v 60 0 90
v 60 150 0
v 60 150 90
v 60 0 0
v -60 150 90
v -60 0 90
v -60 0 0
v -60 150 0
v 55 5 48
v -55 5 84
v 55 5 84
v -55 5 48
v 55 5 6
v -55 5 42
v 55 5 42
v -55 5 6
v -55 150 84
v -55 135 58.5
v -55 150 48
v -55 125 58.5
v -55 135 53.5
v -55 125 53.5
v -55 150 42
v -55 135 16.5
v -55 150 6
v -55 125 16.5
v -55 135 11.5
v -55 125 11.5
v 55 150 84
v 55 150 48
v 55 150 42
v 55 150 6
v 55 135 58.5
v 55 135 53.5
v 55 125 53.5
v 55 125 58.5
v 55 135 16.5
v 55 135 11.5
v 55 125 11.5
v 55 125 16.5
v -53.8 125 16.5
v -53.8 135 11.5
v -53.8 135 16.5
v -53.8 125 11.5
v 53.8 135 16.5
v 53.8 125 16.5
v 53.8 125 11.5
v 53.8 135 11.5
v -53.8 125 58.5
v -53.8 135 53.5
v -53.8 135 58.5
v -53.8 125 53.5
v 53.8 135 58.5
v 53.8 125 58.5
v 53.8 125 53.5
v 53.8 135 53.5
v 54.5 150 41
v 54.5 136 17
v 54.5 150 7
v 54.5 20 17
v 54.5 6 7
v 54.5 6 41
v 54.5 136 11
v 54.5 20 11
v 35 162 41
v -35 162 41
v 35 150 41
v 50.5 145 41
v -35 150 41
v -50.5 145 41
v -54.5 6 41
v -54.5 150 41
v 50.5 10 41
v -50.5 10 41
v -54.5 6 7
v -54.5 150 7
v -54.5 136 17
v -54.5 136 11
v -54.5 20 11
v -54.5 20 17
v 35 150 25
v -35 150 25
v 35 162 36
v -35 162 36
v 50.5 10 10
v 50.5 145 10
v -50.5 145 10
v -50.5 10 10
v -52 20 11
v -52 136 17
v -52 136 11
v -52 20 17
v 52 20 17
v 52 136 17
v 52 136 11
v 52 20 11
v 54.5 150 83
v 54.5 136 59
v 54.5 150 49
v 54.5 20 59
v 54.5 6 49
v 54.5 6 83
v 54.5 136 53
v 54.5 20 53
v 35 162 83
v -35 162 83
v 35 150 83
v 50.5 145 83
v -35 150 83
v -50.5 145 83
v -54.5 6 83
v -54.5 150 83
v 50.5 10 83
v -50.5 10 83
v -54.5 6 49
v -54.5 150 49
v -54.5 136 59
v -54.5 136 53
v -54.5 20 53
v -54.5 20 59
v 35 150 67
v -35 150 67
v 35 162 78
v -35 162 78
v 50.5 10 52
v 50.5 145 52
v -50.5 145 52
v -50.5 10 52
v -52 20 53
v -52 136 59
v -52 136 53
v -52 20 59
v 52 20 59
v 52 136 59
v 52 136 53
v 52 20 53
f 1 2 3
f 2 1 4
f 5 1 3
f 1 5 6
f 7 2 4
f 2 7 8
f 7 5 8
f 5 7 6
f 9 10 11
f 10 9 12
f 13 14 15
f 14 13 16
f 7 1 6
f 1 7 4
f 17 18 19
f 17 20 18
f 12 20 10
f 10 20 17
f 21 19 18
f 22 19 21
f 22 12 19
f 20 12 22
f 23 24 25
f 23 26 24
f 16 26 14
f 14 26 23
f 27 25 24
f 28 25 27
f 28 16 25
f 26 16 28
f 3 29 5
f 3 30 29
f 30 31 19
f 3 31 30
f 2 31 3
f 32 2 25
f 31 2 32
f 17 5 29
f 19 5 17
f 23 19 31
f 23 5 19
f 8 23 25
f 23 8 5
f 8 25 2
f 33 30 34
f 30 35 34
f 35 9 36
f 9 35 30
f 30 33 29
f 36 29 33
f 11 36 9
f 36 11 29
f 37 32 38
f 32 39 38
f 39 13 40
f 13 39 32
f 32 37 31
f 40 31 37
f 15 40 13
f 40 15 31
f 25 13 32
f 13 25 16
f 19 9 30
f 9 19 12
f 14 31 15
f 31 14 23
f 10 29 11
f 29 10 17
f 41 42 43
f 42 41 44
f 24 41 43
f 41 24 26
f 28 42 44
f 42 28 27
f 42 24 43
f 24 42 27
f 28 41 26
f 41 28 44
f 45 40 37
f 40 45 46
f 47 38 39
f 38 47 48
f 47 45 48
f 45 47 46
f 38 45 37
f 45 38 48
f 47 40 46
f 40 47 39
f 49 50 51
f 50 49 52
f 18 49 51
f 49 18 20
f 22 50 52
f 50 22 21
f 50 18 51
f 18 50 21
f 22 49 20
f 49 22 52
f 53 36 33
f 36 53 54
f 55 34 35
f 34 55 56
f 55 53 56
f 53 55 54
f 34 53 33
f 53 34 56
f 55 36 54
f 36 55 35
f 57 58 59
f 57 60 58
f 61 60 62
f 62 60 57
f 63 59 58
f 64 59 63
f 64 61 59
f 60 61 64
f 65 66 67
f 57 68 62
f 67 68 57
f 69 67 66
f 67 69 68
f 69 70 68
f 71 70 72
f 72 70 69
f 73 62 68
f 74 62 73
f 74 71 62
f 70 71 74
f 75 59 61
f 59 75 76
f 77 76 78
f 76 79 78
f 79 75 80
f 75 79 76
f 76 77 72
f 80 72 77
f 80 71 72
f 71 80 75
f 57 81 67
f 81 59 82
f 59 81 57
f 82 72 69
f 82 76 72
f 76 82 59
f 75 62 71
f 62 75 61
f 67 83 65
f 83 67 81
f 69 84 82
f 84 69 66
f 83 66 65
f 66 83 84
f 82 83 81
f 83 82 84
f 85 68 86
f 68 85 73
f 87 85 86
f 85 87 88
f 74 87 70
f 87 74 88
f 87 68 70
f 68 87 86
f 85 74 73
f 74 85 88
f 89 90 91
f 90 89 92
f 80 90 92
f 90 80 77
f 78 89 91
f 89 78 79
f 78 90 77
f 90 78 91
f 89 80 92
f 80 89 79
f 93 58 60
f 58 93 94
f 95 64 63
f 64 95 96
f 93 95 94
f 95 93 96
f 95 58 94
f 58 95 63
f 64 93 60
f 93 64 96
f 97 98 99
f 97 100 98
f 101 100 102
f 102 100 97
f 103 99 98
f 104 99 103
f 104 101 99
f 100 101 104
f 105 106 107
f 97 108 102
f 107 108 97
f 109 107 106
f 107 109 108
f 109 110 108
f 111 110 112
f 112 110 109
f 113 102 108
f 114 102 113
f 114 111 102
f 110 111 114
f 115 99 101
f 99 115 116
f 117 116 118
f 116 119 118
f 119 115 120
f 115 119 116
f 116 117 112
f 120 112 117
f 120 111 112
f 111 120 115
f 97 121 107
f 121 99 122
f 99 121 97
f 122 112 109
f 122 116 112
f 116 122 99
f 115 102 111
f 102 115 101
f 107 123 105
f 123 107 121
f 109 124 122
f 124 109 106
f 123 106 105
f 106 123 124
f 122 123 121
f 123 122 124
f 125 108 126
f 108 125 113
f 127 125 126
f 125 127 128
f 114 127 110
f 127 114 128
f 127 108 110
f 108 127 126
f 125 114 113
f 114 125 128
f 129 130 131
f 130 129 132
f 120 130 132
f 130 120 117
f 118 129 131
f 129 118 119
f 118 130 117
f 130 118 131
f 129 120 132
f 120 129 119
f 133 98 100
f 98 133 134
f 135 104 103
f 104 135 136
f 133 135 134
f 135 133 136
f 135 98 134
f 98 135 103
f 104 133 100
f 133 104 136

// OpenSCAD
part = "assembly"; // [assembly:Assembly, frame:Frame, drawer:Drawer]
cadverify_only = "";
module instance(name, part, unit = 1) {
    echo(cadverify_instance = [name, part, unit]);
    if (cadverify_only == "" || cadverify_only == name) children();
}
// frame assembly coords: X -60..60, Y 0..150, Z 0..90
module frame_asm() {
    union() {
        translate([-60,0,0]) cube([120,5,90]);
        translate([-60,0,0]) cube([5,150,90]);
        translate([55,0,0]) cube([5,150,90]);
        translate([-55,5,0]) cube([110,145,6]);
        translate([-55,5,42]) cube([110,145,6]);
        translate([-55,5,84]) cube([110,145,6]);
        translate([-55,125,11.5]) cube([1.2,10,5]);
        translate([53.8,125,11.5]) cube([1.2,10,5]);
        translate([-55,125,53.5]) cube([1.2,10,5]);
        translate([53.8,125,53.5]) cube([1.2,10,5]);
    }
}
module frame_print() {
    translate([0,90,0]) rotate([90,0,0]) frame_asm();
}
// drawer part coords: X -54.5..54.5, Y 0..144 body + handle to 156, Z 0..34
module drawer_raw() {
    difference() {
        union() {
            translate([-54.5,0,0]) cube([109,144,34]);
            // handle wedge (solid triangular prism via hull) + tip block, overlapped for manifold union
            hull() {
                translate([-35,143,18]) cube([70,1,1]);
                translate([-35,143,29]) cube([70,1,1]);
                translate([-35,155,29]) cube([70,1,1]);
            }
            translate([-35,143,29]) cube([70,13,5]);
        }
        translate([-50.5,4,3]) cube([101,135,32]);
        translate([-54.5,14,4]) cube([2.5,116,6]);
        translate([52,14,4]) cube([2.5,116,6]);
    }
}
module drawer_part() { drawer_raw(); }
module frame_spec() {
    echo(cadverify_spec = [
        ["bounds", [[-60,0,0],[60,90,150]]],
        ["bodies", 1],
        ["through_holes", 0],
        ["support_faces", [["bed","-z",5000]]],
        ["overhangs_allowed", [
            ["stop tab underside, bridge 1.2mm", [[-55,73,124],[-53.8,79,126]]],
            ["stop tab underside, bridge 1.2mm", [[53.8,73,124],[55,79,126]]],
            ["stop tab underside, bridge 1.2mm", [[-55,31,124],[-53.8,37,126]]],
            ["stop tab underside, bridge 1.2mm", [[53.8,31,124],[55,37,126]]]
        ]],
        ["copies", 1],
        ["details", [
            ["back_panel","material",[[-60,0,0],[60,90,5]],0.9],
            ["stop_tab_ll","material",[[-55,73.5,125],[-53.8,78.5,135]],0.9],
            ["stop_tab_lr","material",[[53.8,73.5,125],[55,78.5,135]],0.9],
            ["stop_tab_ul","material",[[-55,73.5,125],[-53.8,78.5,135]],0.9],
            ["stop_tab_ur","material",[[53.8,73.5,125],[55,78.5,135]],0.9],
            ["lower_cavity","void",[[-55,48,5],[55,84,150]],0.9],
            ["upper_cavity","void",[[-55,6,5],[55,42,150]],0.9],
            ["back","thickness",[0,10,-1],[0,0,1],5]
        ]]
    ]);
}
module drawer_spec() {
    echo(cadverify_spec = [
        ["bounds", [[-54.5,0,0],[54.5,156,34]]],
        ["bodies", 1],
        ["through_holes", 0],
        ["support_faces", [["bed","-z",10000]]],
        ["overhangs_allowed", [
            ["drawer slide groove ceiling, bridge 5mm", [[-54.5,14,9],[-52,130,11]]],
            ["drawer slide groove ceiling, bridge 5mm", [[52,14,9],[54.5,130,11]]]
        ]],
        ["copies", 2],
        ["details", [
            ["pull_tip","material",[[-35,150,30],[35,156,34]],0.9],
            ["groove_left","void",[[-54.5,14,4],[-52,130,10]],0.9],
            ["groove_right","void",[[52,14,4],[54.5,130,10]],0.9],
            ["drawer_cavity","void",[[-50.5,4,3],[50.5,139,34]],0.9],
            ["bottom","thickness",[0,70,-1],[0,0,1],3],
            ["side_walls","thickness",[-55.5,70,20],[1,0,0],4],
            ["pull_shape","view",[[-35,144,18],[35,156,34]]]
        ]]
    ]);
}
module assembly_spec() {
    echo(cadverify_spec = [
        ["bounds", [[-60,0,0],[60,162,90]]],
        ["support_faces", [["base","-z",5000]]],
        ["allowed_interferences", []],
        ["motions", [
            ["drawer_lower_slide", ["drawer_lower"], "slide", [0,1,0], [0,105], ["stops", [0,105]]],
            ["drawer_upper_slide", ["drawer_upper"], "slide", [0,1,0], [0,105], ["stops", [0,105]]]
        ]],
        ["assembly_order", [
            [["frame"], [0,0,0]],
            [["drawer_lower"], [0,-1,0], ["flex", [["drawer_lower","frame",0.7,"stop tabs snap into grooves"]]]],
            [["drawer_upper"], [0,-1,0], ["flex", [["drawer_upper","frame",0.7,"stop tabs snap into grooves"]]]]
        ]]
    ]);
}
if (part == "frame") { frame_spec(); frame_print(); }
else if (part == "drawer") { drawer_spec(); drawer_part(); }
else if (part == "assembly") {
    assembly_spec();
    instance("frame","frame",1) frame_asm();
    instance("drawer_lower","drawer",1) translate([0,6,7]) drawer_raw();
    instance("drawer_upper","drawer",1) translate([0,6,49]) drawer_raw();
}
